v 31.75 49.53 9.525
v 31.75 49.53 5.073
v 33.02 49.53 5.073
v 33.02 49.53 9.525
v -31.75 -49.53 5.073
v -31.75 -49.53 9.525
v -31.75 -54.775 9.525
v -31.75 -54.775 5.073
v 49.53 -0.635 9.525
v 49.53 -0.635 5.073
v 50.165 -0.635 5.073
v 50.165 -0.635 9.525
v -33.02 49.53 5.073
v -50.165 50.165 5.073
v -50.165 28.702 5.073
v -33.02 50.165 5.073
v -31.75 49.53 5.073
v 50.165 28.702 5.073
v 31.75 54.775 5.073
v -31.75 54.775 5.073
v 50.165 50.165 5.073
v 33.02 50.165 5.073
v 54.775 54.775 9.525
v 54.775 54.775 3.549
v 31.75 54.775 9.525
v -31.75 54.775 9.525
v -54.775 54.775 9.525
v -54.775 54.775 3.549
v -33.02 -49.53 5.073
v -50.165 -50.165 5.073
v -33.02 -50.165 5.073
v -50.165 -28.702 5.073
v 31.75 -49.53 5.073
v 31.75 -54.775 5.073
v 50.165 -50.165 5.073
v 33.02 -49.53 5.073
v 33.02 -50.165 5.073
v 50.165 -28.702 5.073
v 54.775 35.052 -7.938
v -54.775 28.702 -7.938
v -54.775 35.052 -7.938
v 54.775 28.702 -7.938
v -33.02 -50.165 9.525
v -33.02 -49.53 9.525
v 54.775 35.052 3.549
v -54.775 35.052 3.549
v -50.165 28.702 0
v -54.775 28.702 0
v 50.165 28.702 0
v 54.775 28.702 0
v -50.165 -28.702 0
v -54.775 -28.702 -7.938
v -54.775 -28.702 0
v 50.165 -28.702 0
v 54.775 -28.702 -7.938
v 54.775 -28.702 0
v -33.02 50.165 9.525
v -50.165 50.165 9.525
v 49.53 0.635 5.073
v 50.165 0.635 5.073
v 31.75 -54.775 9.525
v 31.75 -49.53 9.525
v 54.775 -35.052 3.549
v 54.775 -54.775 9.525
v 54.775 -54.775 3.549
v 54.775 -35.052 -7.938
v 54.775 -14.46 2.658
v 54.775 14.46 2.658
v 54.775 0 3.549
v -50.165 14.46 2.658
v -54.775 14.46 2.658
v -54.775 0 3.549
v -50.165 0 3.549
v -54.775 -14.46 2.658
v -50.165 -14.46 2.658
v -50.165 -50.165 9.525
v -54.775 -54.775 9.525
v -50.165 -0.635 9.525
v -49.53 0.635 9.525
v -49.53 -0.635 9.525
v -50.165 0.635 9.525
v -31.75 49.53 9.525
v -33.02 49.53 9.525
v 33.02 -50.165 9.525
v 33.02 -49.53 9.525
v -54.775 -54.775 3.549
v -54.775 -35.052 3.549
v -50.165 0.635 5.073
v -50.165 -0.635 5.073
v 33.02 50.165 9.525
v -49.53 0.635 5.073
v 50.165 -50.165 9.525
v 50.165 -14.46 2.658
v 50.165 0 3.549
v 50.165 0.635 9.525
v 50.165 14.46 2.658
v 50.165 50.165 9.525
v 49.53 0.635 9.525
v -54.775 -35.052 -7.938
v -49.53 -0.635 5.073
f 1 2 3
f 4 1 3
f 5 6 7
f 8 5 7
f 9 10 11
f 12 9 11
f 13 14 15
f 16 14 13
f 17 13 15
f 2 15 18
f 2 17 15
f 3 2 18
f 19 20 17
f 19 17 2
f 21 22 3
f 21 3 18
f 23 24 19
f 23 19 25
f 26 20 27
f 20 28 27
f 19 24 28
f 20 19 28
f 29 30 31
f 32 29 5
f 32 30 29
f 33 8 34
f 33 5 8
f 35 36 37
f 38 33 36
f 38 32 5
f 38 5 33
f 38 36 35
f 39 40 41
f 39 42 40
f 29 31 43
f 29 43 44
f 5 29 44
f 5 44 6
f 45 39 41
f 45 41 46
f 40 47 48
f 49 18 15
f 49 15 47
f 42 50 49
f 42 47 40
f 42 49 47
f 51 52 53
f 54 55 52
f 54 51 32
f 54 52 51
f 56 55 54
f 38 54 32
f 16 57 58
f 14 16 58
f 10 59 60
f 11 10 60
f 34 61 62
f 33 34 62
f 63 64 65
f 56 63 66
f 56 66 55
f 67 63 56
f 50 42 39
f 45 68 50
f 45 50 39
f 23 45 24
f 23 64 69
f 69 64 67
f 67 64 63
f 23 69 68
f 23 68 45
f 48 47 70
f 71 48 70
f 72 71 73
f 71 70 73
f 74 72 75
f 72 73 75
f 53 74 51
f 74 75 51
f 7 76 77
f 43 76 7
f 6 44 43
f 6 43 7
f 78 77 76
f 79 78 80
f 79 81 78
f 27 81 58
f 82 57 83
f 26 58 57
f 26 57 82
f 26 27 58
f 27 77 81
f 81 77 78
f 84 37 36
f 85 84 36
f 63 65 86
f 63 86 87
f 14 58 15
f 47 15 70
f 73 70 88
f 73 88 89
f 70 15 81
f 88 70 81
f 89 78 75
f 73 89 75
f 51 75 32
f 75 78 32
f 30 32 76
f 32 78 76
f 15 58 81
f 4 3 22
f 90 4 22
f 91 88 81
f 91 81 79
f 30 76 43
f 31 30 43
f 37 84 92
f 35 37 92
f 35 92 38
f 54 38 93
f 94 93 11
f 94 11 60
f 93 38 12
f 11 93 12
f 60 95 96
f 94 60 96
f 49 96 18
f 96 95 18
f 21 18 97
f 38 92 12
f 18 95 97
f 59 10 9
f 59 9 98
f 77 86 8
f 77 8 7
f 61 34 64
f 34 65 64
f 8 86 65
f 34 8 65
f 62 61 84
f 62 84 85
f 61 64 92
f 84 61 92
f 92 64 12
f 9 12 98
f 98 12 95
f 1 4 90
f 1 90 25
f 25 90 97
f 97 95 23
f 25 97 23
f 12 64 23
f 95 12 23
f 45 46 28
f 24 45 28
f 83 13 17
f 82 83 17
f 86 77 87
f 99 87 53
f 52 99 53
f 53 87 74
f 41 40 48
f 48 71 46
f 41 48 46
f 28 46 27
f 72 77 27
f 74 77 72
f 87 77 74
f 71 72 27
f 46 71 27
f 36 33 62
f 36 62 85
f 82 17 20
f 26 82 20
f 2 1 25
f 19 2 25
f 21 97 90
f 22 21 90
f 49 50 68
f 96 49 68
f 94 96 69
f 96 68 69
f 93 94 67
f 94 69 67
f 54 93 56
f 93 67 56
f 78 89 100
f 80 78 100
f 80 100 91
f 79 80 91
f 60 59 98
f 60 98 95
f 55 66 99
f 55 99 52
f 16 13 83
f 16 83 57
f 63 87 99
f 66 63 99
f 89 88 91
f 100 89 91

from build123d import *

# Parameters (mm, degrees)
F1_DEPTH      = 54.7751
F1_DEPTH_BACK = 54.7751
F3_DEPTH      = 54.7761
F3_DEPTH_BACK = 54.7761
F4_W          = 109.5502
F4_H          = 5.9763903179
F5_DEPTH      = 54.7751
F5_DEPTH_BACK = 54.7751
F7_DEPTH      = 4.4523903179
F8_W          = 57.404
F8_H          = 17.4625
F9_DEPTH      = 50.165
F9_DEPTH_BACK = 50.165
F10_W         = 1.27
F10_H         = 0.635
F10_W_2       = 0.635
F10_H_2       = 1.27
F11_DEPTH     = 4.4523903179


with BuildPart() as f1:
    # F0 (on Right) → F1 (new body, two sides)
    with BuildSketch(Plane.YZ) as f1_sk:
        Polygon((35.052, 9.525), (-35.052, 9.525), (-35.052, -7.9375), (-28.702, -7.9375), (-28.702, 0), (28.702, 0), (28.702, -7.9375), (35.052, -7.9375), align=None)
    extrude(amount=F1_DEPTH)
    extrude(f1_sk.sketch, amount=-F1_DEPTH_BACK)

    # F2 (on Right) → F3 (cut, two sides)
    with BuildSketch(Plane.YZ) as f3_sk:
        with BuildLine():
            ThreePointArc((28.702, 0), (0, 3.5486096821), (-28.702, 0))
            Line((-28.702, 0), (28.702, 0))
        make_face()
    extrude(amount=F3_DEPTH, mode=Mode.SUBTRACT)
    extrude(f3_sk.sketch, amount=-F3_DEPTH_BACK, mode=Mode.SUBTRACT)

    # F4 (on Right) → F5 (join, two sides)
    with BuildSketch(Plane.YZ) as f5_sk:
        with Locations((0, 6.536804841)):
            Rectangle(F4_W, F4_H)
    extrude(amount=F5_DEPTH)
    extrude(f5_sk.sketch, amount=-F5_DEPTH_BACK)

    # F6 (on face) → F7 (cut, through all)
    with BuildSketch(Plane.XY.offset(9.525)):
        Polygon((50.165, -50.165), (50.165, 50.165), (31.75, 50.165), (31.75, 54.7751), (-31.75, 54.7751), (-31.75, 50.165), (-50.165, 50.165), (-50.165, -50.165), (-31.75, -50.165), (-31.75, -54.7751), (31.75, -54.7751), (31.75, -50.165), align=None)
    extrude(amount=-F7_DEPTH, mode=Mode.SUBTRACT)

    # F8 (on Right) → F9 (cut, two sides)
    with BuildSketch(Plane.YZ) as f9_sk:
        with Locations((0, 0.79375)):
            Rectangle(F8_W, F8_H)
    extrude(amount=F9_DEPTH, mode=Mode.SUBTRACT)
    extrude(f9_sk.sketch, amount=-F9_DEPTH_BACK, mode=Mode.SUBTRACT)

    # F10 (on face) → F11 (join, through all)
    with BuildSketch(Plane.XY.offset(5.0726096821)):
        with Locations((-32.385, 49.8475)):
            Rectangle(F10_W, F10_H)
        with Locations((32.385, 49.8475)):
            Rectangle(F10_W, F10_H)
        with Locations((-32.385, -49.8475)):
            Rectangle(F10_W, F10_H)
        with Locations((32.385, -49.8475)):
            Rectangle(F10_W, F10_H)
        with Locations((-49.8475, 0)):
            Rectangle(F10_W_2, F10_H_2)
        with Locations((49.8475, 0)):
            Rectangle(F10_W_2, F10_H_2)
    extrude(amount=F11_DEPTH)


solid = f1.part
